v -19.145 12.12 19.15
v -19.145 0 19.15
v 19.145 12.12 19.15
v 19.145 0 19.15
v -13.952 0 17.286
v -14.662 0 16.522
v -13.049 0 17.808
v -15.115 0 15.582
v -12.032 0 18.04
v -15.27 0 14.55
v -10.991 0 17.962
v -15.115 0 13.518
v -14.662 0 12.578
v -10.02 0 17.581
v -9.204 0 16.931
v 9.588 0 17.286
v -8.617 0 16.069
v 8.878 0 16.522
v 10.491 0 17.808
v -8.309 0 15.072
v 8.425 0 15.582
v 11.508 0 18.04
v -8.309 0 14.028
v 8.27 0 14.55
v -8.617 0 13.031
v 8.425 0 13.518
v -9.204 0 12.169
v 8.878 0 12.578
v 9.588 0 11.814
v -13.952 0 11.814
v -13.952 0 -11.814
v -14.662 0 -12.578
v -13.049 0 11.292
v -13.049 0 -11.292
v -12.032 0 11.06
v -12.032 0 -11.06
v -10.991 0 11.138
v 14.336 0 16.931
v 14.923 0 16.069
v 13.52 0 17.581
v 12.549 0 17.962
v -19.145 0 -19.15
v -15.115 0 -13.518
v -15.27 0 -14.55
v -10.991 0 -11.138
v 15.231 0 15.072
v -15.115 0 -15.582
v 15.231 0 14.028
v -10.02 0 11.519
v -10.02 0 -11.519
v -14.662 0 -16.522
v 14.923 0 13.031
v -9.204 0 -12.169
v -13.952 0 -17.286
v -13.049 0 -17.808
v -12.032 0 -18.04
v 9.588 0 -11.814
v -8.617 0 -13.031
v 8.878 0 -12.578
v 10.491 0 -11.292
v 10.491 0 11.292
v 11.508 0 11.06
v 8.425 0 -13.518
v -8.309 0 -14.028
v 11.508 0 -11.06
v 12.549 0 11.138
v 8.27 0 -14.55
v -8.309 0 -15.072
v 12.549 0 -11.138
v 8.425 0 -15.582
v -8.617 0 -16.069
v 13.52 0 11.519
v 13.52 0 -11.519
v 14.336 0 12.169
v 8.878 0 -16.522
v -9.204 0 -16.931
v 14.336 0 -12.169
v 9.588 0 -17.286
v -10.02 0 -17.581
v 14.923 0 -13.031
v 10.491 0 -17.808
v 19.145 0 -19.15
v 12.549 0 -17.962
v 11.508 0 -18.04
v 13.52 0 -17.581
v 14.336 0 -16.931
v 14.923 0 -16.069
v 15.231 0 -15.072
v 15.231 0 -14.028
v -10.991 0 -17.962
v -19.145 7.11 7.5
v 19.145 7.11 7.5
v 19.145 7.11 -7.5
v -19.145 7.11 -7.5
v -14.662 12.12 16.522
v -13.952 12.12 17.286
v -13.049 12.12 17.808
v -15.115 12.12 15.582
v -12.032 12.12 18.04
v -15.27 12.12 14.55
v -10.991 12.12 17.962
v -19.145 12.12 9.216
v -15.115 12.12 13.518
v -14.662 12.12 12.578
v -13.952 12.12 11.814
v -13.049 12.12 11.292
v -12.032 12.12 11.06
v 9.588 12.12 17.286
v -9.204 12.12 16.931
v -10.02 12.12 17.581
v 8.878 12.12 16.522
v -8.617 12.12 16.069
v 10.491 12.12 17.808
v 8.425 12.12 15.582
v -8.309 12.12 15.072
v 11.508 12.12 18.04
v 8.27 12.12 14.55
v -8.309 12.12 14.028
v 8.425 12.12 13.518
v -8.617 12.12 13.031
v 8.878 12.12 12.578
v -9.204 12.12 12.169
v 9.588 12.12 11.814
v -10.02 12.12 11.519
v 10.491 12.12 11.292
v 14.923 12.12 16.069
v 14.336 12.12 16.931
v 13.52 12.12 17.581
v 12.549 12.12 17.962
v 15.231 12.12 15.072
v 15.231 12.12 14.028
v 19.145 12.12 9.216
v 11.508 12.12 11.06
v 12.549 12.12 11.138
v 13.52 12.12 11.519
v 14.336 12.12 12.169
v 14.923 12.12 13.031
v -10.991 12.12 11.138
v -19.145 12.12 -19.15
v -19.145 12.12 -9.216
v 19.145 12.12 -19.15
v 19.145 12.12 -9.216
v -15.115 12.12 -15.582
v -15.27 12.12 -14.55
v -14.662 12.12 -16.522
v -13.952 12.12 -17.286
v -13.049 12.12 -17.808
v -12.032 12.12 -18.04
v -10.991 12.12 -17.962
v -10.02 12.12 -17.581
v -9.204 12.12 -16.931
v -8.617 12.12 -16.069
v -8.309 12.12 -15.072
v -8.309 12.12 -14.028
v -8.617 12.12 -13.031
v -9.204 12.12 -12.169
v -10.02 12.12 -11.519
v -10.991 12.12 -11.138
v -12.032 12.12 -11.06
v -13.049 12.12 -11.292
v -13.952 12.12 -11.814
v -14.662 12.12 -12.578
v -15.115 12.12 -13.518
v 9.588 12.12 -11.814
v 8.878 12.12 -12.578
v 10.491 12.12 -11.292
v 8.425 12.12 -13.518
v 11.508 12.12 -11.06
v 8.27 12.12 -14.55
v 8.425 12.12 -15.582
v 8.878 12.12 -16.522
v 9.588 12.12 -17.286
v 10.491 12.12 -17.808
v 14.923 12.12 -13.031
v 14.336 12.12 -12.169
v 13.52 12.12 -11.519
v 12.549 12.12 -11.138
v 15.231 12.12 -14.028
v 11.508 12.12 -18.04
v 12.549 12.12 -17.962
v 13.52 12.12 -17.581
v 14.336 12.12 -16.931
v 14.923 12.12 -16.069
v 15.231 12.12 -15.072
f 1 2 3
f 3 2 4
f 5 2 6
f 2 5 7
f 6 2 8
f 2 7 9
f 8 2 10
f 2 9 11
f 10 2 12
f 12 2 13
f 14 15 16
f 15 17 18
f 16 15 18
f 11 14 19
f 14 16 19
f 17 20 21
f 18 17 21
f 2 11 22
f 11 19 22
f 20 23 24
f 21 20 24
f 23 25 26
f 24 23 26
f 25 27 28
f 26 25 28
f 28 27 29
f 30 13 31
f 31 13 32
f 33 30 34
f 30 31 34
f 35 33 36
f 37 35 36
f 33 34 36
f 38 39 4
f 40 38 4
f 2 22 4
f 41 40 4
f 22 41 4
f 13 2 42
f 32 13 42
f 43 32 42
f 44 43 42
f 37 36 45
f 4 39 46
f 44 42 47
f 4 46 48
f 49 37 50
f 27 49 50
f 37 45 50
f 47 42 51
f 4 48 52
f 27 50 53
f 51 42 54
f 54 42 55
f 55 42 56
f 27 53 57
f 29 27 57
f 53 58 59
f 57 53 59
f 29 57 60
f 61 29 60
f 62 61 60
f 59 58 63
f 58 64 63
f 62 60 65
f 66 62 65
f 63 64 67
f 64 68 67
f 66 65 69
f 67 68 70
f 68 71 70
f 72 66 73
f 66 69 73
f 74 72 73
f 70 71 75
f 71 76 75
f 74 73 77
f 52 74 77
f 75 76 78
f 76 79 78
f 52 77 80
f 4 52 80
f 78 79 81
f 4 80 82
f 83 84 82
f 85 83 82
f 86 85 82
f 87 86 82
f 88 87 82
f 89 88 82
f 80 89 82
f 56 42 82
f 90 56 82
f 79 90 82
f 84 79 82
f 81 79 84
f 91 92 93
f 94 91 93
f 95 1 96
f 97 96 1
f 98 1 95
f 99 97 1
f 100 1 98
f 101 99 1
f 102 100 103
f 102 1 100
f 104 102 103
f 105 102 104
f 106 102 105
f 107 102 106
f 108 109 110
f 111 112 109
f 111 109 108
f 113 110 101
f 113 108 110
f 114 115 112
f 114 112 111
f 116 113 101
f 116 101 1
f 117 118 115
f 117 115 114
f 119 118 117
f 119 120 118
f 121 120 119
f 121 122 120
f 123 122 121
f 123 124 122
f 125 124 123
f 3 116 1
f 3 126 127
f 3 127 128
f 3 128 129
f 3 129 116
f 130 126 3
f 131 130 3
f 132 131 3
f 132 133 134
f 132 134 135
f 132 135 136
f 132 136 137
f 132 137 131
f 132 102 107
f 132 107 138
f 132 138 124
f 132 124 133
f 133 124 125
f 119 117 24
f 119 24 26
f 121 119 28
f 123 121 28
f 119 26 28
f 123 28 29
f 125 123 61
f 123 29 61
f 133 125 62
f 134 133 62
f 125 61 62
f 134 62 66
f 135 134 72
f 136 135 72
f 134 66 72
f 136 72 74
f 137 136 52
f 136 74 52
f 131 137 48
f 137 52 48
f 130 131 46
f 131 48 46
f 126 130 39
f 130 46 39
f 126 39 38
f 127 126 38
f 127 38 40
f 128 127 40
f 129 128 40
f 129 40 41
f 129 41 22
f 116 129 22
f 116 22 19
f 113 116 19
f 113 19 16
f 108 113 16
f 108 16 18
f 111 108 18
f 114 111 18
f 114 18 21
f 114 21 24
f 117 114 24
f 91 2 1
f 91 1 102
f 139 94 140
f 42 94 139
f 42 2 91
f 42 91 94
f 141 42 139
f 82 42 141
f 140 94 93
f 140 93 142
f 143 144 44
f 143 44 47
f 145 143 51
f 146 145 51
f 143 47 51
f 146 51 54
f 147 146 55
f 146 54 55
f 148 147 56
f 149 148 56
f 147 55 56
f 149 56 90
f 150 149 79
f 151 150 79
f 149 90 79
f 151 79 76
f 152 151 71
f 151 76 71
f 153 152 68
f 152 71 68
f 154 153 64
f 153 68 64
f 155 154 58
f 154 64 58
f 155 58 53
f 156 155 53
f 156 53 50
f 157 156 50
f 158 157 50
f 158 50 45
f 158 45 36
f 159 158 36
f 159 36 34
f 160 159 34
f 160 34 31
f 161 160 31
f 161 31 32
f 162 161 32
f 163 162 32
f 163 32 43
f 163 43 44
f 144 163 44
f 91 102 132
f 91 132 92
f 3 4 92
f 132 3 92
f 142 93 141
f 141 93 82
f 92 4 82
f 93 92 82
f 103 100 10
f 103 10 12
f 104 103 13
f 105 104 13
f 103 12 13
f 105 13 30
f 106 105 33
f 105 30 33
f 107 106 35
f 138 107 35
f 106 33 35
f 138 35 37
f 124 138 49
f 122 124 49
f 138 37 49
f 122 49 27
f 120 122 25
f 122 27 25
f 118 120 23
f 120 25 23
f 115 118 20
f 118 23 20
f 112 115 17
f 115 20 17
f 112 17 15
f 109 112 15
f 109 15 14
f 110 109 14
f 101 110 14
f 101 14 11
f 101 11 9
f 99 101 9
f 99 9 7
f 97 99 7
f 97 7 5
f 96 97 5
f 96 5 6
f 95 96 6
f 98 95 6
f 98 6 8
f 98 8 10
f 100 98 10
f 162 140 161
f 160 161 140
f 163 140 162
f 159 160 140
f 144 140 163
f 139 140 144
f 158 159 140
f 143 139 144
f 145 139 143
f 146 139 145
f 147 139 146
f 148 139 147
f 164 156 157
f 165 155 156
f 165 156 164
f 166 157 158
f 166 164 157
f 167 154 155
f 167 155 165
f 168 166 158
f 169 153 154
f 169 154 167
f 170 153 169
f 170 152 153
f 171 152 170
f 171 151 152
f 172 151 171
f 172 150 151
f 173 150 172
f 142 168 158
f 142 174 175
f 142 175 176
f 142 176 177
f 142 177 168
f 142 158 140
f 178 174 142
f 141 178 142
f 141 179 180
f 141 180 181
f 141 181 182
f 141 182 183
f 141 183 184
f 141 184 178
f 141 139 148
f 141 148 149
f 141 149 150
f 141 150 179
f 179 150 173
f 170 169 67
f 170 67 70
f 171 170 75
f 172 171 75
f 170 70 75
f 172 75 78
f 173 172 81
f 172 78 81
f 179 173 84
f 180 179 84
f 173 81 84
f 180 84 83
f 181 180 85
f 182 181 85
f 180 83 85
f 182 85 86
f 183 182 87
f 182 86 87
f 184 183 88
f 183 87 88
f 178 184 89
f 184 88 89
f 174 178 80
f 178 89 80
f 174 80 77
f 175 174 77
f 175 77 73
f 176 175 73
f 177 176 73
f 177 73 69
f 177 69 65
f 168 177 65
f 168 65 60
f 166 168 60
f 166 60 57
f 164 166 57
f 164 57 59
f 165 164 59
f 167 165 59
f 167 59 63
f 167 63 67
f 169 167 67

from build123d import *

# Parameters (mm, degrees)
SKETCH1_W                            = 38.29
SKETCH1_H                            = 38.3
BOSS_EXTRUDE1_DEPTH                  = 12.12
CUT_EXTRUDE1_DEPTH                   = 45.494280531
M8X1_0_TAPPED_HOLE2_D                = 7
MIRROR1_AT_THE_SECOND_PLANE_COPY_1_D = 7


with BuildPart() as part:
    # Sketch1 → Boss-Extrude1 (new body)
    with BuildSketch(Plane(origin=(0, 0, 0), x_dir=(1, 0, 0), z_dir=(0, 1, 0))):
        Rectangle(SKETCH1_W, SKETCH1_H)
    extrude(amount=BOSS_EXTRUDE1_DEPTH)

    # Sketch2 → Cut-Extrude1 (cut, through all)
    with BuildSketch(Plane(origin=(19.145, 0, 0), x_dir=(0, 0, -1), z_dir=(1, 0, 0))):
        with BuildLine():
            Line((8.348193896, 12.12), (-7.620525527, 12.12))
            ThreePointArc((-7.620525527, 12.12), (-7.350184436, 9.500113986), (-6.243729663, 7.11))
            Line((-6.243729663, 7.11), (6.971398032, 7.11))
            ThreePointArc((6.971398032, 7.11), (8.007802748, 9.259969363), (8.363834185, 11.62))
            ThreePointArc((8.363834185, 11.62), (8.359923156, 11.870122279), (8.348193896, 12.12))
        make_face()
        with BuildLine():
            Line((-7.620525527, 12.12), (-9.216421688, 12.12))
            Line((-9.216421688, 12.12), (-7.5, 7.11))
            Line((-7.5, 7.11), (-6.243729663, 7.11))
            ThreePointArc((-6.243729663, 7.11), (-7.350184436, 9.500113986), (-7.620525527, 12.12))
        make_face()
        with BuildLine():
            Line((9.216421688, 12.12), (8.348193896, 12.12))
            ThreePointArc((8.348193896, 12.12), (8.359923156, 11.870122279), (8.363834185, 11.62))
            ThreePointArc((8.363834185, 11.62), (8.007802748, 9.259969363), (6.971398032, 7.11))
            Line((6.971398032, 7.11), (7.5, 7.11))
            Line((7.5, 7.11), (9.216421688, 12.12))
        make_face()
    extrude(amount=-CUT_EXTRUDE1_DEPTH, mode=Mode.SUBTRACT)

    # M8x1.0 Tapped Hole2 (through all)
    with Locations(Plane(origin=(0, 12.12, 0), x_dir=(1, 0, 0), z_dir=(0, 1, 0))):
        with Locations((-11.77, 14.55), (11.77, 14.55), (-11.77, -14.55), (11.77, -14.55)):
            m8x1_0_tapped_hole2 = Hole(M8X1_0_TAPPED_HOLE2_D / 2)

    # Mirror1: M8x1.0 Tapped Hole2 across plane
    add(m8x1_0_tapped_hole2.mirror(Plane.XY), mode=Mode.SUBTRACT)

    # Mirror1 at the second plane: M8x1.0 Tapped Hole2 across plane
    add(m8x1_0_tapped_hole2.mirror(Plane(origin=(0, 0, 0), x_dir=(0, 0, 1), z_dir=(1, 0, 0))), mode=Mode.SUBTRACT)

    # Mirror1 at the second plane copy 1 (through all)
    with Locations(Plane(origin=(0, 12.12, 0), x_dir=(-1, 0, 0), z_dir=(0, 1, 0))):
        with Locations((-11.77, 14.55), (11.77, 14.55), (-11.77, -14.55), (11.77, -14.55)):
            Hole(MIRROR1_AT_THE_SECOND_PLANE_COPY_1_D / 2)


solid = part.part
